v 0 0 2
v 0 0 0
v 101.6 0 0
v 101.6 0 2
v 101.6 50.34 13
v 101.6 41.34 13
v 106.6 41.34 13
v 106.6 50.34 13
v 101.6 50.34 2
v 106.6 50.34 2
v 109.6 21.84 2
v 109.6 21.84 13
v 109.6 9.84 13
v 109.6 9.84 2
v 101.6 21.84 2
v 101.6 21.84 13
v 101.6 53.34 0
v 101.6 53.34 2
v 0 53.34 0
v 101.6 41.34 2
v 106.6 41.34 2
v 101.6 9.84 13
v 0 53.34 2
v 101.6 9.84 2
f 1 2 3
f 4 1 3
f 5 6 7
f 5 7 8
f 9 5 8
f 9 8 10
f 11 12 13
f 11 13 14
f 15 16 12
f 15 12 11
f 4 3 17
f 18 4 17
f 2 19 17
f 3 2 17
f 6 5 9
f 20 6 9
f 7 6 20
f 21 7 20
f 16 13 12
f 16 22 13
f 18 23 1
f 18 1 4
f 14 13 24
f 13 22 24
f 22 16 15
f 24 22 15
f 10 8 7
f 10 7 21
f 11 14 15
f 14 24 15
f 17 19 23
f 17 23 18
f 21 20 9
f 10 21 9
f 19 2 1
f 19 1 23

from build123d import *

# Parameters (mm, degrees)
ESBO_O1_W                  = 101.6
ESBO_O1_H                  = 53.34
RESSALTO_EXTRUS_O1_DEPTH   = 2
ESBO_O2_W                  = 11
ESBO_O2_H                  = 9
RESSALTO_EXTRUS_O2_DEPTH   = 5
ESBO_O2_H_2                = 12
RESSALTO_EXTRUS_O2_2_DEPTH = 5
ESBO_O3_W                  = 11
ESBO_O3_H                  = 12
RESSALTO_EXTRUS_O3_DEPTH   = 3


with BuildPart() as part:
    # Esboço1 → Ressalto-extrusão1 (new body)
    with BuildSketch(Plane.XY):
        with Locations((50.8, 26.67)):
            Rectangle(ESBO_O1_W, ESBO_O1_H)
    extrude(amount=RESSALTO_EXTRUS_O1_DEPTH)


with BuildPart() as body_2:
    # Esboço2 → Ressalto-extrusão2 (new body)
    with BuildSketch(Plane(origin=(101.6, 0, 0), x_dir=(0, 0, -1), z_dir=(1, 0, 0))):
        with Locations((-7.5, 45.84)):
            Rectangle(ESBO_O2_W, ESBO_O2_H)
    extrude(amount=RESSALTO_EXTRUS_O2_DEPTH)


with BuildPart() as body_3:
    # Esboço2 → Ressalto-extrus_o2 2 (new body)
    with BuildSketch(Plane(origin=(101.6, 0, 0), x_dir=(0, 0, -1), z_dir=(1, 0, 0))):
        with Locations((-7.5, 15.84)):
            Rectangle(ESBO_O2_W, ESBO_O2_H_2)
    extrude(amount=RESSALTO_EXTRUS_O2_2_DEPTH)

    # Esboço3 → Ressalto-extrusão3 (add)
    with BuildSketch(Plane(origin=(106.6, 0, 0), x_dir=(0, 0, -1), z_dir=(1, 0, 0))):
        with Locations((-7.5, 15.84)):
            Rectangle(ESBO_O3_W, ESBO_O3_H)
    extrude(amount=RESSALTO_EXTRUS_O3_DEPTH)


solid = Compound([part.part, body_2.part, body_3.part])
